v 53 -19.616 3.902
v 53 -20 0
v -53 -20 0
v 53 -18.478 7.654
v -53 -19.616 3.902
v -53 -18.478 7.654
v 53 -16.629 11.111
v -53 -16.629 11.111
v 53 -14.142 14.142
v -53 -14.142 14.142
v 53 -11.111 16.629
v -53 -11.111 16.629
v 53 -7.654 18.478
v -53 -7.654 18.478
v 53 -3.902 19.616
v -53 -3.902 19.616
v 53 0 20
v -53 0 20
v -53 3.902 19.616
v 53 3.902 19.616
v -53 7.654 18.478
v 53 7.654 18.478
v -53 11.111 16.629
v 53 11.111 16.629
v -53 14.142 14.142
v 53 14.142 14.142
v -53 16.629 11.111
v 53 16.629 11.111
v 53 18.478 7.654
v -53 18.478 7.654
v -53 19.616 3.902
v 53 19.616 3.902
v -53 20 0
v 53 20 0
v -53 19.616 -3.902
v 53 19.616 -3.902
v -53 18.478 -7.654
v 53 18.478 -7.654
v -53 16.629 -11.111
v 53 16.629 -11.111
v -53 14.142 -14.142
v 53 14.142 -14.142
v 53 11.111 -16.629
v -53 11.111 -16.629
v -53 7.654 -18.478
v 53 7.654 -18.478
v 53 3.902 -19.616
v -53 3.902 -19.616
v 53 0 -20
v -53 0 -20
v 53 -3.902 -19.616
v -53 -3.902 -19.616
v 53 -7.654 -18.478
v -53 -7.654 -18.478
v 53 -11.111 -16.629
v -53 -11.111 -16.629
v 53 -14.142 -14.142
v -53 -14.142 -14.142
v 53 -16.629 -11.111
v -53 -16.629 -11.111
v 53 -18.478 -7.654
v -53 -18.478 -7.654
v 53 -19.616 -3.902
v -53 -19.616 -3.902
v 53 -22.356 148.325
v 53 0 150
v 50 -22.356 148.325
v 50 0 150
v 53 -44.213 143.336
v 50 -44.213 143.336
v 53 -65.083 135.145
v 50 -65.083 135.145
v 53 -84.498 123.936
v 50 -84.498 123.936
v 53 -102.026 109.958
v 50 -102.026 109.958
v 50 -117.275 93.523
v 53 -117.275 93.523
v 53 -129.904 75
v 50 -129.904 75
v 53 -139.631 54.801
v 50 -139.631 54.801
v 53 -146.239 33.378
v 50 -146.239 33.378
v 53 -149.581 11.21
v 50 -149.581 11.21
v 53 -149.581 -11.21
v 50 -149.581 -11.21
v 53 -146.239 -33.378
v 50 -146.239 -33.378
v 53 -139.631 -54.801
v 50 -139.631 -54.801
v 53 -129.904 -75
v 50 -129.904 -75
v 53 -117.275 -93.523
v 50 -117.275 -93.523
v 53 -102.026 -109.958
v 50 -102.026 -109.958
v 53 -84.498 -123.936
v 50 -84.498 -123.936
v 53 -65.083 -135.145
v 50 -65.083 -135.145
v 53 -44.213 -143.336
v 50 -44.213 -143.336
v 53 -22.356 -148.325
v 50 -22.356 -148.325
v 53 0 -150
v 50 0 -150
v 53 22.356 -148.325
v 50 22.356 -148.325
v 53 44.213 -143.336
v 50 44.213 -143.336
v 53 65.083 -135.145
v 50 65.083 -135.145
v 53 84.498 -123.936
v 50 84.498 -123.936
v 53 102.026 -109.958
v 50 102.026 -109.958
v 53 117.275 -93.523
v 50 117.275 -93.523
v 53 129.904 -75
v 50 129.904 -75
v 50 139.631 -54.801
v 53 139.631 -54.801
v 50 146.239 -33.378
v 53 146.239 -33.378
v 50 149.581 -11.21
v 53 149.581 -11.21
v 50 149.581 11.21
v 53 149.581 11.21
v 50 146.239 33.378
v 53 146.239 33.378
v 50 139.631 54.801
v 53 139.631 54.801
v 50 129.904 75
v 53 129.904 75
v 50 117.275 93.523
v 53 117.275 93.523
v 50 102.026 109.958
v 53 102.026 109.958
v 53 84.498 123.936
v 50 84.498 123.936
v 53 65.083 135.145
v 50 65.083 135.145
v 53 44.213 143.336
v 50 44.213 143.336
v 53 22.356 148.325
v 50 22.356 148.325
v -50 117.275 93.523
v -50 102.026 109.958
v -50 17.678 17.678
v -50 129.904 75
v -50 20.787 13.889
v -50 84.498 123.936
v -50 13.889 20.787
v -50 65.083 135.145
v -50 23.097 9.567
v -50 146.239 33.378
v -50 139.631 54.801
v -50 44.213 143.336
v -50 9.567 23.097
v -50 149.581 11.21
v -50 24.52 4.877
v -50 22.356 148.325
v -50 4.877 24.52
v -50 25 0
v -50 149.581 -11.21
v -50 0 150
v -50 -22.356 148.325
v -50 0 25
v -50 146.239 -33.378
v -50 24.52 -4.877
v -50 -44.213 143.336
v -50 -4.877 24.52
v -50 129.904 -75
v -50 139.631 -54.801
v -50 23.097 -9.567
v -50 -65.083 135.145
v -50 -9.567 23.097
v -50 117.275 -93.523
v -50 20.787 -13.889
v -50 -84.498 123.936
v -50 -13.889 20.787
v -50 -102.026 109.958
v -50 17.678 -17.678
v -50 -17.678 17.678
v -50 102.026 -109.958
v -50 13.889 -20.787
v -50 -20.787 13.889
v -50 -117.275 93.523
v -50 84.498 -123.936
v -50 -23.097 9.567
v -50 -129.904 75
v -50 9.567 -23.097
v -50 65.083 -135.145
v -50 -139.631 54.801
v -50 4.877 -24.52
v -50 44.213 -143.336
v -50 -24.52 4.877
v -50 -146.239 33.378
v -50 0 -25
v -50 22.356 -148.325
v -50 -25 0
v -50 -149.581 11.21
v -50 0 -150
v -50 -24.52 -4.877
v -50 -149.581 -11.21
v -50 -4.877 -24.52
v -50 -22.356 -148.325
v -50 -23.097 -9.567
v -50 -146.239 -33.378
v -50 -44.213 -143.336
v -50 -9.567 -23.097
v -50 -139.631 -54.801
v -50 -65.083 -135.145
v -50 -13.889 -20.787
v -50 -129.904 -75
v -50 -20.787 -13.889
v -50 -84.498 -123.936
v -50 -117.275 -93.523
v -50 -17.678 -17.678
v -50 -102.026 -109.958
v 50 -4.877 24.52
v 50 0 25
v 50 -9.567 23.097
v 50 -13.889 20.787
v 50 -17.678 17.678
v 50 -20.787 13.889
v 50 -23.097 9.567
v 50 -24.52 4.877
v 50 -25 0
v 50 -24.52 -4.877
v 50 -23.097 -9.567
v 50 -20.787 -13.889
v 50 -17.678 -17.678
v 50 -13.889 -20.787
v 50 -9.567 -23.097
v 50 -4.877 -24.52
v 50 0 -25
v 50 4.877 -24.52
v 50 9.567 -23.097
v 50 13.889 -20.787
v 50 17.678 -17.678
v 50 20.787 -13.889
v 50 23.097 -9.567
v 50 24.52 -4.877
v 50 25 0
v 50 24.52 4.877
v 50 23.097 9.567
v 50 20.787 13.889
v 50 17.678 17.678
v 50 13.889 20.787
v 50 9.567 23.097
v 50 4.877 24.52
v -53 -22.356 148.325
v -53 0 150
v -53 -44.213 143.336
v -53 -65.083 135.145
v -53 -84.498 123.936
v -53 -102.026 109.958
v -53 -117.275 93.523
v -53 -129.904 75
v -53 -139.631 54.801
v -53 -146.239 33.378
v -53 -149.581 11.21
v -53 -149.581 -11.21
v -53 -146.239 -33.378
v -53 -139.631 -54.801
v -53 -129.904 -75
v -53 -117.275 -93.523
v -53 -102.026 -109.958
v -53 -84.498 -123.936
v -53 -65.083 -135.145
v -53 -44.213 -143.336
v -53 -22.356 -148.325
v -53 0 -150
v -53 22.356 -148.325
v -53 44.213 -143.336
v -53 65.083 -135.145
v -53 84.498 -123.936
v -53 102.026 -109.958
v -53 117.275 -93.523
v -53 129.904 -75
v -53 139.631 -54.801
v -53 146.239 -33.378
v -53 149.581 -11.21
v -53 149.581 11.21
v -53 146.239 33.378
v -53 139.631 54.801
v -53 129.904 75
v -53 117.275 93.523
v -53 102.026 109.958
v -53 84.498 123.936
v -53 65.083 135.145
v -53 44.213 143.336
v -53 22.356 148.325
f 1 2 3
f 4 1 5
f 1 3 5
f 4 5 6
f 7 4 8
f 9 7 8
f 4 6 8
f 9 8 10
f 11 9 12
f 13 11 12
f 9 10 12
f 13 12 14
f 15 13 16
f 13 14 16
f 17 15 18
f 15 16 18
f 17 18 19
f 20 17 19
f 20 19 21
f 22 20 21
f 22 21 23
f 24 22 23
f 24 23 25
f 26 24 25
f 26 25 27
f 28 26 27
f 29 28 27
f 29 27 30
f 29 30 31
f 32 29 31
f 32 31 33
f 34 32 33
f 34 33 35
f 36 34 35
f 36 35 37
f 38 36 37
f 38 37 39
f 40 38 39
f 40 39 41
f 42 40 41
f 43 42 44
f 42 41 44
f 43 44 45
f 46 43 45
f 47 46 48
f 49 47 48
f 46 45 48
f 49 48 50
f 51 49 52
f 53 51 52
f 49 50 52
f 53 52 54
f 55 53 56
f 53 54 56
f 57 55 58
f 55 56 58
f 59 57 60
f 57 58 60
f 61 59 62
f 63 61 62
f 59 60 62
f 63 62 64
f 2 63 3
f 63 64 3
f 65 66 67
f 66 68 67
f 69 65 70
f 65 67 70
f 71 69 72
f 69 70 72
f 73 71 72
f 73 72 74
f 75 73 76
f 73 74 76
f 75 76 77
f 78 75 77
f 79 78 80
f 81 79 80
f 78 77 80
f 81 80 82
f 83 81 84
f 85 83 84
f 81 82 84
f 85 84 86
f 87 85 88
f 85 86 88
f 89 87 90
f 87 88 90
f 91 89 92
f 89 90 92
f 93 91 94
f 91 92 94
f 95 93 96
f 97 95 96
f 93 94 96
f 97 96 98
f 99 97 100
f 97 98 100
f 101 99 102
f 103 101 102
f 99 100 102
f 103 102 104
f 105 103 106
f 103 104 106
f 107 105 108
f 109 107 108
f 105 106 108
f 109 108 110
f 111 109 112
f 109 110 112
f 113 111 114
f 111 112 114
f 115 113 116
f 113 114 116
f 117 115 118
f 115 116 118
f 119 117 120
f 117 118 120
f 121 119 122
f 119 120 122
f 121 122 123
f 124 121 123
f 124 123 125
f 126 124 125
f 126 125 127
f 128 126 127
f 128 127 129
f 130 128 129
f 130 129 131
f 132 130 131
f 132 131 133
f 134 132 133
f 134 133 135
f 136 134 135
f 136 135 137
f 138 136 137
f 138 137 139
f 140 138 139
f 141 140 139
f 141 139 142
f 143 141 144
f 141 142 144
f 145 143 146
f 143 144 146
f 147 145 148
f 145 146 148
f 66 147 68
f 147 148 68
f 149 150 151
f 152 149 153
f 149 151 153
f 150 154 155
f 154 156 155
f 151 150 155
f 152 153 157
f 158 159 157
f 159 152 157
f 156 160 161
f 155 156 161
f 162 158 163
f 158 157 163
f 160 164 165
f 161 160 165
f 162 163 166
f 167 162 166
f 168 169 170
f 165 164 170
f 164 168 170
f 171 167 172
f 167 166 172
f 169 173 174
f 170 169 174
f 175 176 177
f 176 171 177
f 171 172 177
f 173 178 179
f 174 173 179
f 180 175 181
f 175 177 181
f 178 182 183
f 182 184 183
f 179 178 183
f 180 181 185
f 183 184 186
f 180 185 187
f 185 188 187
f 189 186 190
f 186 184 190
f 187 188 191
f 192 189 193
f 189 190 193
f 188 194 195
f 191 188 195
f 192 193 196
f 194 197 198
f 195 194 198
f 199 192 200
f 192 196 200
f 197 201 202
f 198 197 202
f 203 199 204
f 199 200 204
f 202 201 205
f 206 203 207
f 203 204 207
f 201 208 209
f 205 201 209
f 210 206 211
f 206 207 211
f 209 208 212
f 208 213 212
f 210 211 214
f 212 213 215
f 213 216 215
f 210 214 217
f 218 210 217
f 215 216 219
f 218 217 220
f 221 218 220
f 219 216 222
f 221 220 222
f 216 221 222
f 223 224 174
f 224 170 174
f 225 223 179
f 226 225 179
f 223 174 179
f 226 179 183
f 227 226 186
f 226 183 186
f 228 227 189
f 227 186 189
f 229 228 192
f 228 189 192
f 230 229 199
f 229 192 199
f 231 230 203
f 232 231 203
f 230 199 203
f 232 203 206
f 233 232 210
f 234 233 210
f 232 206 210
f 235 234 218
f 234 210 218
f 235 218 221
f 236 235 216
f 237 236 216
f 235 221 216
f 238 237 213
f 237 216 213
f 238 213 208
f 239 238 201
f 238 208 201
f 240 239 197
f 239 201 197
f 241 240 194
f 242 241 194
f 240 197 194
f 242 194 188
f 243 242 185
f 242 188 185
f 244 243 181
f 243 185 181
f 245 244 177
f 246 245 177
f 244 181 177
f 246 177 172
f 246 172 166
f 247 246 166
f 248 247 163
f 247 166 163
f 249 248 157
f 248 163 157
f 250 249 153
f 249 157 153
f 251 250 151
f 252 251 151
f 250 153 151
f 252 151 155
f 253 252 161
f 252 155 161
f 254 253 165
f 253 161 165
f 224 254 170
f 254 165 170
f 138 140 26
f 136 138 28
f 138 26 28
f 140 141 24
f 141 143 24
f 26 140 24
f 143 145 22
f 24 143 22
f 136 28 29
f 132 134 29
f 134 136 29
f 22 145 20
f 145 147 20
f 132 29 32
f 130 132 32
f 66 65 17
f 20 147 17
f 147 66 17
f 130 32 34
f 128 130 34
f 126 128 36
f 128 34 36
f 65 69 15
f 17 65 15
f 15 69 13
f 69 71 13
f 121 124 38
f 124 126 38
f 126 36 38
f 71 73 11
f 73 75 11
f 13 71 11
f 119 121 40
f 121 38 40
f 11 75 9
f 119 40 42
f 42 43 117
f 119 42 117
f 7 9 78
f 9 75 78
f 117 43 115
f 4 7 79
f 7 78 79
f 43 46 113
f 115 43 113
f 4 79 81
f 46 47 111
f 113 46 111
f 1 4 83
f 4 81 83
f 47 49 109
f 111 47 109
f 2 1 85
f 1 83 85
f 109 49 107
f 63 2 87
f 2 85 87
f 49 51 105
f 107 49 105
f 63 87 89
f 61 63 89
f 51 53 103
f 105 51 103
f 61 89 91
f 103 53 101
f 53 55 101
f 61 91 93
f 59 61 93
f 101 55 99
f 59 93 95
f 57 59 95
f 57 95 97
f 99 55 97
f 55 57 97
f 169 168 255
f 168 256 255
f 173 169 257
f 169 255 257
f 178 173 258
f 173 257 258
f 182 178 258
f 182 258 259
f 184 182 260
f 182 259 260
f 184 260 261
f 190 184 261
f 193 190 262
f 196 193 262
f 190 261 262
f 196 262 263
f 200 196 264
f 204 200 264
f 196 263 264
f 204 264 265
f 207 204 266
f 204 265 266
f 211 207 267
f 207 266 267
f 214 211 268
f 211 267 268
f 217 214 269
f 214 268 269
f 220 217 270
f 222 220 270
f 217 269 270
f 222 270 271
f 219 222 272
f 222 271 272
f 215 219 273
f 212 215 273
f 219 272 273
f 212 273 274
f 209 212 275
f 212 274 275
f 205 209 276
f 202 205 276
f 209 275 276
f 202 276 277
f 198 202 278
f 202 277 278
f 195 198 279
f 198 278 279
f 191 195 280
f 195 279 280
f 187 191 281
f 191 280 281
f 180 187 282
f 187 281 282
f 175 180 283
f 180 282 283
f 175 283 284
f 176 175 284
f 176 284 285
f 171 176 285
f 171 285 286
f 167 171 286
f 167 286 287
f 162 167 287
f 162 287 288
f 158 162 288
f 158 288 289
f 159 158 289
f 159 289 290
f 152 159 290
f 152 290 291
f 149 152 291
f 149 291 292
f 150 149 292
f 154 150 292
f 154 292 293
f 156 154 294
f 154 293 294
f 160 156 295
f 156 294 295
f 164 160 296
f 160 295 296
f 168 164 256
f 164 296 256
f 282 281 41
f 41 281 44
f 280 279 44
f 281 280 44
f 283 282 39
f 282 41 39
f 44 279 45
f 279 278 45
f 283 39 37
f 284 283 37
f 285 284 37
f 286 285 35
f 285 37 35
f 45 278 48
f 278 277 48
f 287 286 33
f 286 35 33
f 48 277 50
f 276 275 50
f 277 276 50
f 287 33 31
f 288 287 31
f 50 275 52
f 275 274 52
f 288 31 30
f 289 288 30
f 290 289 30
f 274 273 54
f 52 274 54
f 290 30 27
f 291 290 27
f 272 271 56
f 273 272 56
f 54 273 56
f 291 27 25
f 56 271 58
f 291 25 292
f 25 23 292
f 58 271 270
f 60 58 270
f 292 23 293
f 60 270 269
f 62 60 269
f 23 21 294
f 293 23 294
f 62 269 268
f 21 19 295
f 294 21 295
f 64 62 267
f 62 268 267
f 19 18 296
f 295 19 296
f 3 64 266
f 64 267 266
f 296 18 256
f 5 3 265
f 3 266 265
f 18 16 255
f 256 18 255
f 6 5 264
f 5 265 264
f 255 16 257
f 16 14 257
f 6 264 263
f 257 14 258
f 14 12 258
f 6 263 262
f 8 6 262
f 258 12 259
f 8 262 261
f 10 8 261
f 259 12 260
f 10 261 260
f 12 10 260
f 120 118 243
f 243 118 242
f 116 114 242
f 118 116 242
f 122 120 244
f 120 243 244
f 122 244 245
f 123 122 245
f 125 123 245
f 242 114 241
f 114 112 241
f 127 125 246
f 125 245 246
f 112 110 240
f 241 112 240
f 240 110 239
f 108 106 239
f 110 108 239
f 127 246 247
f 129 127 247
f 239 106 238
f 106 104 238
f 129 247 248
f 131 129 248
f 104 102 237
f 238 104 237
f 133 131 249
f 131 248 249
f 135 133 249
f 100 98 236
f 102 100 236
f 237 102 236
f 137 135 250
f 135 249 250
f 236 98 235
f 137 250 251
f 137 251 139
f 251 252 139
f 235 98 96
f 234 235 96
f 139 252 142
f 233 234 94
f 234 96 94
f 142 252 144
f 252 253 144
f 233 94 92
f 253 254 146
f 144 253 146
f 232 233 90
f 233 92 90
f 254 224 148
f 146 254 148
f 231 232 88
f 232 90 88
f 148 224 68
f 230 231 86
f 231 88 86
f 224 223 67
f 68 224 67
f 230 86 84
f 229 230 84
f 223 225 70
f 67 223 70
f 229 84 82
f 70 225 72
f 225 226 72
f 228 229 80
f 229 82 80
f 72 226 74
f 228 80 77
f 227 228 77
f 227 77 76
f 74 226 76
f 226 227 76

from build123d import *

# Parameters (mm, degrees)
F3_D = 40


with BuildPart() as f1:
    # F0 (on Front) → F1 (revolve)
    with BuildSketch(Plane.XZ):
        Polygon((50, 25), (0, 25), (-50, 25), (-50, 150), (-53, 150), (-53, 0), (0, 0), (53, 0), (53, 150), (50, 150), align=None)
    revolve(axis=Axis((58.566779, 0, 0), (1, 0, 0)))

    # F3 (through all)
    with Locations(Plane.YZ.offset(53)):
        with Locations((0, 0)):
            Hole(F3_D / 2)


solid = f1.part
